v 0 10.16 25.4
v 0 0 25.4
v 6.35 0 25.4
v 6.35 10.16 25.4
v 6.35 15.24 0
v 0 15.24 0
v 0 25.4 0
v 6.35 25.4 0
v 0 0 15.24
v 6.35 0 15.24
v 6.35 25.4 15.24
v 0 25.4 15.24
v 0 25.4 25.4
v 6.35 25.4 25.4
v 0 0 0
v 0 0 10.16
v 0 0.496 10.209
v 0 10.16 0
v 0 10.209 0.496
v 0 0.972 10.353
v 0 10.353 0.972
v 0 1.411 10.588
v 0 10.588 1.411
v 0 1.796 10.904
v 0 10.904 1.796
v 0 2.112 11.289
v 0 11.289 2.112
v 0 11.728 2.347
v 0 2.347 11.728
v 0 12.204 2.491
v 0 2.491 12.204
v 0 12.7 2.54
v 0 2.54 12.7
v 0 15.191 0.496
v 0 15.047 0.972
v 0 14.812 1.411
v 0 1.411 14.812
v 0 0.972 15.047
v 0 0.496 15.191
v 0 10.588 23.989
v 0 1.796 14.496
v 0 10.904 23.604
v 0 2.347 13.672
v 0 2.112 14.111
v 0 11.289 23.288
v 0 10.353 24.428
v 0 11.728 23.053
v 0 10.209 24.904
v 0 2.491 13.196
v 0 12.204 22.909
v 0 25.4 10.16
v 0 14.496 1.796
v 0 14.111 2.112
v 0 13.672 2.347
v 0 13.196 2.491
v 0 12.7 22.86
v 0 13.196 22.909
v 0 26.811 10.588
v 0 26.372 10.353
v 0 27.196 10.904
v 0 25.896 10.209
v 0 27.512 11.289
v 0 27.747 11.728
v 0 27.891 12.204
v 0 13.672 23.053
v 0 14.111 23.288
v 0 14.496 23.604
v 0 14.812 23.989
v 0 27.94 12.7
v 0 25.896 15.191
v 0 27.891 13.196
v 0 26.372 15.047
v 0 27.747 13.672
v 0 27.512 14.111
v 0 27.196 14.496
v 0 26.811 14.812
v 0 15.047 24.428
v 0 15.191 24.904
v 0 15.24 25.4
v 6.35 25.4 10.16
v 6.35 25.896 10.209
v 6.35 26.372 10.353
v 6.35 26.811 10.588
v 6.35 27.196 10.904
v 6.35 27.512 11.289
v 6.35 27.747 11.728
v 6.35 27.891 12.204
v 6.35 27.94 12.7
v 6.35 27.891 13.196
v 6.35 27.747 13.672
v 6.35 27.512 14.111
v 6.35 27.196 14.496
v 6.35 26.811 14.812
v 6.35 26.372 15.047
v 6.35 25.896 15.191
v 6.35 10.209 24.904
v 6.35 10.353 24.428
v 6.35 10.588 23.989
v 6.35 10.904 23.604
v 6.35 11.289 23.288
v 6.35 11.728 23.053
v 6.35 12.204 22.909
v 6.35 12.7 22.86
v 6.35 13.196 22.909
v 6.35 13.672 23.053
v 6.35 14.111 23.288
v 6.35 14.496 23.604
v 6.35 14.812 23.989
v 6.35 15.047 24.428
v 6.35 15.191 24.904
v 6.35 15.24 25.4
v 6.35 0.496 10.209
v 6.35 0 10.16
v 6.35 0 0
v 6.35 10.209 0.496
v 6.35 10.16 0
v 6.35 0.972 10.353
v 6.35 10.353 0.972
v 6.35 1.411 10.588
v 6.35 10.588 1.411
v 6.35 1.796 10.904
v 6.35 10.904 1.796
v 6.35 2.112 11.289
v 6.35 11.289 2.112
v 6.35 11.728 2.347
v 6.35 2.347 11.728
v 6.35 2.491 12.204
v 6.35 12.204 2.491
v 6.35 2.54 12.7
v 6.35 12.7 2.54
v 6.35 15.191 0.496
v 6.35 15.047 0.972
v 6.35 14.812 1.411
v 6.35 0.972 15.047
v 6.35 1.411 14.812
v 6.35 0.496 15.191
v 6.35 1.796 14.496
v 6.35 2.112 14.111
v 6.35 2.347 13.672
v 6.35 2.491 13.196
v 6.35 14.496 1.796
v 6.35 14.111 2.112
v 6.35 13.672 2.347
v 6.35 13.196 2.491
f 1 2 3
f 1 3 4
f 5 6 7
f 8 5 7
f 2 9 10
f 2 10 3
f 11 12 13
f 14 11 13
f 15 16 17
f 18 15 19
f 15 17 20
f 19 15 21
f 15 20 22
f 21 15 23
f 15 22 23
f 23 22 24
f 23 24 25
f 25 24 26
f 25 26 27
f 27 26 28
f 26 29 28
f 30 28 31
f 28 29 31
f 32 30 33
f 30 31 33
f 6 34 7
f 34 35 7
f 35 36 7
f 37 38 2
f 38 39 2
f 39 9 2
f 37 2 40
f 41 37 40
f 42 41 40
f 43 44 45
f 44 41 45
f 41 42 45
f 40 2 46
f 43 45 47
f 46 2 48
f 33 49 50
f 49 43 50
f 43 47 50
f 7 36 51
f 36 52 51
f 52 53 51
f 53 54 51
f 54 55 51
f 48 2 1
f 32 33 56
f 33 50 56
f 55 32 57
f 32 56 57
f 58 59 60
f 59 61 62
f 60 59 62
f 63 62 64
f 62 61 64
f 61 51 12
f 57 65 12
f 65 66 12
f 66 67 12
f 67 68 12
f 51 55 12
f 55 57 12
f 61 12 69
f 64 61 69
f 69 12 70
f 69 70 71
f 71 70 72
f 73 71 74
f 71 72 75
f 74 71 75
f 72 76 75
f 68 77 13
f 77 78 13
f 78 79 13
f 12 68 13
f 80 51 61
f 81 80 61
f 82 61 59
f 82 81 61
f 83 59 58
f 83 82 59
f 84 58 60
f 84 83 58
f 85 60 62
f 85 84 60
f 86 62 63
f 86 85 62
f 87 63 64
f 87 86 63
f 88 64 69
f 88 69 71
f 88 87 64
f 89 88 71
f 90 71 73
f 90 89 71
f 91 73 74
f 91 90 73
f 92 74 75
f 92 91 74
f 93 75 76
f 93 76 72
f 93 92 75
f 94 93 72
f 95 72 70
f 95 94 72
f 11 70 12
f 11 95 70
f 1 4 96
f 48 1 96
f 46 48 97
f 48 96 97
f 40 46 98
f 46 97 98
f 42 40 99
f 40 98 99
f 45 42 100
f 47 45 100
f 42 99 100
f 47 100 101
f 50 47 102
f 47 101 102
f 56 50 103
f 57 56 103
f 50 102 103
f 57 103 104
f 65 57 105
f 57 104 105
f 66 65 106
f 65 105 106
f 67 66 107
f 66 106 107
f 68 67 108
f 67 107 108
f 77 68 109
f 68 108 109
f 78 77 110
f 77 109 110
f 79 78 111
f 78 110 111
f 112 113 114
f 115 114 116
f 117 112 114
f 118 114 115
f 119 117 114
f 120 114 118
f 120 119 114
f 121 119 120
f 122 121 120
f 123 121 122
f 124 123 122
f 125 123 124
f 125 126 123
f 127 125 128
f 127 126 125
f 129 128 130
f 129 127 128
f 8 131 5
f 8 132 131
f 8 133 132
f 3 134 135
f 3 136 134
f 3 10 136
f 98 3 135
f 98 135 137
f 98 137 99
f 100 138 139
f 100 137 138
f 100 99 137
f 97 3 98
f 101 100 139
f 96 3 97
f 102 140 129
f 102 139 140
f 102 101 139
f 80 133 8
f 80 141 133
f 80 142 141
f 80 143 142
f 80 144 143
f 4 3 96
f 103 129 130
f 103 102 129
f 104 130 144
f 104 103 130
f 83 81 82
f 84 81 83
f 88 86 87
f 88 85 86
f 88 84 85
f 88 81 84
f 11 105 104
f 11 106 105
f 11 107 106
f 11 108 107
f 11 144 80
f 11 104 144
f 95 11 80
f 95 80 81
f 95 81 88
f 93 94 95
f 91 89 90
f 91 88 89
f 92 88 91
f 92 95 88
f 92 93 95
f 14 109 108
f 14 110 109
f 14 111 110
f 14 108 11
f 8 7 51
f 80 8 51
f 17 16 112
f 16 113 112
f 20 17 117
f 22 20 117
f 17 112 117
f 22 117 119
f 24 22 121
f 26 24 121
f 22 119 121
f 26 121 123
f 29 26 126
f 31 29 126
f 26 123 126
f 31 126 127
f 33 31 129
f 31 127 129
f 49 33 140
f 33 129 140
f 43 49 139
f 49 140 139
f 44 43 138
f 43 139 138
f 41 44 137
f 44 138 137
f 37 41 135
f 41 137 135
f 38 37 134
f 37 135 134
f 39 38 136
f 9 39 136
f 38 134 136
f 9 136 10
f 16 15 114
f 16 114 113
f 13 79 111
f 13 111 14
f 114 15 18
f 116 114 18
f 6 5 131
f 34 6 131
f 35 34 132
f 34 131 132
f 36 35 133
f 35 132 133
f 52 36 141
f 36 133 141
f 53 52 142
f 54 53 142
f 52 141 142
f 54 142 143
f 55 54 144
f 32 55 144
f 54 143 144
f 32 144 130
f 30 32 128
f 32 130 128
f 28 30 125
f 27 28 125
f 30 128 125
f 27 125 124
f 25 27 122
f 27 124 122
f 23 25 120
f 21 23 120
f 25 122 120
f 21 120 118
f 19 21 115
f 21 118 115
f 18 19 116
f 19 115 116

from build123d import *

# Parameters (mm, degrees)
F0_W     = 25.4
F0_H     = 25.4
F1_DEPTH = 6.35
F2_R     = 2.54
F3_DEPTH = 6.35
F4_R     = 2.54
F5_DEPTH = 6.35


with BuildPart() as f1:
    # F0 (on Right) → F1 (new body)
    with BuildSketch(Plane.YZ):
        with Locations((12.7, 12.7)):
            Rectangle(F0_W, F0_H)
    extrude(amount=F1_DEPTH)

    # F2 (on face) → F3 (cut)
    with BuildSketch(Plane.YZ.offset(6.35)):
        with Locations((12.7, 0)):
            Circle(F2_R)
        with Locations((0, 12.7)):
            Circle(F2_R)
        with Locations((12.7, 25.4)):
            Circle(F2_R)
    extrude(amount=-F3_DEPTH, mode=Mode.SUBTRACT)

    # F4 (on face) → F5 (join)
    with BuildSketch(Plane.YZ.offset(6.35)):
        with Locations((25.4, 12.7)):
            Circle(F4_R)
    extrude(amount=-F5_DEPTH)


solid = f1.part
